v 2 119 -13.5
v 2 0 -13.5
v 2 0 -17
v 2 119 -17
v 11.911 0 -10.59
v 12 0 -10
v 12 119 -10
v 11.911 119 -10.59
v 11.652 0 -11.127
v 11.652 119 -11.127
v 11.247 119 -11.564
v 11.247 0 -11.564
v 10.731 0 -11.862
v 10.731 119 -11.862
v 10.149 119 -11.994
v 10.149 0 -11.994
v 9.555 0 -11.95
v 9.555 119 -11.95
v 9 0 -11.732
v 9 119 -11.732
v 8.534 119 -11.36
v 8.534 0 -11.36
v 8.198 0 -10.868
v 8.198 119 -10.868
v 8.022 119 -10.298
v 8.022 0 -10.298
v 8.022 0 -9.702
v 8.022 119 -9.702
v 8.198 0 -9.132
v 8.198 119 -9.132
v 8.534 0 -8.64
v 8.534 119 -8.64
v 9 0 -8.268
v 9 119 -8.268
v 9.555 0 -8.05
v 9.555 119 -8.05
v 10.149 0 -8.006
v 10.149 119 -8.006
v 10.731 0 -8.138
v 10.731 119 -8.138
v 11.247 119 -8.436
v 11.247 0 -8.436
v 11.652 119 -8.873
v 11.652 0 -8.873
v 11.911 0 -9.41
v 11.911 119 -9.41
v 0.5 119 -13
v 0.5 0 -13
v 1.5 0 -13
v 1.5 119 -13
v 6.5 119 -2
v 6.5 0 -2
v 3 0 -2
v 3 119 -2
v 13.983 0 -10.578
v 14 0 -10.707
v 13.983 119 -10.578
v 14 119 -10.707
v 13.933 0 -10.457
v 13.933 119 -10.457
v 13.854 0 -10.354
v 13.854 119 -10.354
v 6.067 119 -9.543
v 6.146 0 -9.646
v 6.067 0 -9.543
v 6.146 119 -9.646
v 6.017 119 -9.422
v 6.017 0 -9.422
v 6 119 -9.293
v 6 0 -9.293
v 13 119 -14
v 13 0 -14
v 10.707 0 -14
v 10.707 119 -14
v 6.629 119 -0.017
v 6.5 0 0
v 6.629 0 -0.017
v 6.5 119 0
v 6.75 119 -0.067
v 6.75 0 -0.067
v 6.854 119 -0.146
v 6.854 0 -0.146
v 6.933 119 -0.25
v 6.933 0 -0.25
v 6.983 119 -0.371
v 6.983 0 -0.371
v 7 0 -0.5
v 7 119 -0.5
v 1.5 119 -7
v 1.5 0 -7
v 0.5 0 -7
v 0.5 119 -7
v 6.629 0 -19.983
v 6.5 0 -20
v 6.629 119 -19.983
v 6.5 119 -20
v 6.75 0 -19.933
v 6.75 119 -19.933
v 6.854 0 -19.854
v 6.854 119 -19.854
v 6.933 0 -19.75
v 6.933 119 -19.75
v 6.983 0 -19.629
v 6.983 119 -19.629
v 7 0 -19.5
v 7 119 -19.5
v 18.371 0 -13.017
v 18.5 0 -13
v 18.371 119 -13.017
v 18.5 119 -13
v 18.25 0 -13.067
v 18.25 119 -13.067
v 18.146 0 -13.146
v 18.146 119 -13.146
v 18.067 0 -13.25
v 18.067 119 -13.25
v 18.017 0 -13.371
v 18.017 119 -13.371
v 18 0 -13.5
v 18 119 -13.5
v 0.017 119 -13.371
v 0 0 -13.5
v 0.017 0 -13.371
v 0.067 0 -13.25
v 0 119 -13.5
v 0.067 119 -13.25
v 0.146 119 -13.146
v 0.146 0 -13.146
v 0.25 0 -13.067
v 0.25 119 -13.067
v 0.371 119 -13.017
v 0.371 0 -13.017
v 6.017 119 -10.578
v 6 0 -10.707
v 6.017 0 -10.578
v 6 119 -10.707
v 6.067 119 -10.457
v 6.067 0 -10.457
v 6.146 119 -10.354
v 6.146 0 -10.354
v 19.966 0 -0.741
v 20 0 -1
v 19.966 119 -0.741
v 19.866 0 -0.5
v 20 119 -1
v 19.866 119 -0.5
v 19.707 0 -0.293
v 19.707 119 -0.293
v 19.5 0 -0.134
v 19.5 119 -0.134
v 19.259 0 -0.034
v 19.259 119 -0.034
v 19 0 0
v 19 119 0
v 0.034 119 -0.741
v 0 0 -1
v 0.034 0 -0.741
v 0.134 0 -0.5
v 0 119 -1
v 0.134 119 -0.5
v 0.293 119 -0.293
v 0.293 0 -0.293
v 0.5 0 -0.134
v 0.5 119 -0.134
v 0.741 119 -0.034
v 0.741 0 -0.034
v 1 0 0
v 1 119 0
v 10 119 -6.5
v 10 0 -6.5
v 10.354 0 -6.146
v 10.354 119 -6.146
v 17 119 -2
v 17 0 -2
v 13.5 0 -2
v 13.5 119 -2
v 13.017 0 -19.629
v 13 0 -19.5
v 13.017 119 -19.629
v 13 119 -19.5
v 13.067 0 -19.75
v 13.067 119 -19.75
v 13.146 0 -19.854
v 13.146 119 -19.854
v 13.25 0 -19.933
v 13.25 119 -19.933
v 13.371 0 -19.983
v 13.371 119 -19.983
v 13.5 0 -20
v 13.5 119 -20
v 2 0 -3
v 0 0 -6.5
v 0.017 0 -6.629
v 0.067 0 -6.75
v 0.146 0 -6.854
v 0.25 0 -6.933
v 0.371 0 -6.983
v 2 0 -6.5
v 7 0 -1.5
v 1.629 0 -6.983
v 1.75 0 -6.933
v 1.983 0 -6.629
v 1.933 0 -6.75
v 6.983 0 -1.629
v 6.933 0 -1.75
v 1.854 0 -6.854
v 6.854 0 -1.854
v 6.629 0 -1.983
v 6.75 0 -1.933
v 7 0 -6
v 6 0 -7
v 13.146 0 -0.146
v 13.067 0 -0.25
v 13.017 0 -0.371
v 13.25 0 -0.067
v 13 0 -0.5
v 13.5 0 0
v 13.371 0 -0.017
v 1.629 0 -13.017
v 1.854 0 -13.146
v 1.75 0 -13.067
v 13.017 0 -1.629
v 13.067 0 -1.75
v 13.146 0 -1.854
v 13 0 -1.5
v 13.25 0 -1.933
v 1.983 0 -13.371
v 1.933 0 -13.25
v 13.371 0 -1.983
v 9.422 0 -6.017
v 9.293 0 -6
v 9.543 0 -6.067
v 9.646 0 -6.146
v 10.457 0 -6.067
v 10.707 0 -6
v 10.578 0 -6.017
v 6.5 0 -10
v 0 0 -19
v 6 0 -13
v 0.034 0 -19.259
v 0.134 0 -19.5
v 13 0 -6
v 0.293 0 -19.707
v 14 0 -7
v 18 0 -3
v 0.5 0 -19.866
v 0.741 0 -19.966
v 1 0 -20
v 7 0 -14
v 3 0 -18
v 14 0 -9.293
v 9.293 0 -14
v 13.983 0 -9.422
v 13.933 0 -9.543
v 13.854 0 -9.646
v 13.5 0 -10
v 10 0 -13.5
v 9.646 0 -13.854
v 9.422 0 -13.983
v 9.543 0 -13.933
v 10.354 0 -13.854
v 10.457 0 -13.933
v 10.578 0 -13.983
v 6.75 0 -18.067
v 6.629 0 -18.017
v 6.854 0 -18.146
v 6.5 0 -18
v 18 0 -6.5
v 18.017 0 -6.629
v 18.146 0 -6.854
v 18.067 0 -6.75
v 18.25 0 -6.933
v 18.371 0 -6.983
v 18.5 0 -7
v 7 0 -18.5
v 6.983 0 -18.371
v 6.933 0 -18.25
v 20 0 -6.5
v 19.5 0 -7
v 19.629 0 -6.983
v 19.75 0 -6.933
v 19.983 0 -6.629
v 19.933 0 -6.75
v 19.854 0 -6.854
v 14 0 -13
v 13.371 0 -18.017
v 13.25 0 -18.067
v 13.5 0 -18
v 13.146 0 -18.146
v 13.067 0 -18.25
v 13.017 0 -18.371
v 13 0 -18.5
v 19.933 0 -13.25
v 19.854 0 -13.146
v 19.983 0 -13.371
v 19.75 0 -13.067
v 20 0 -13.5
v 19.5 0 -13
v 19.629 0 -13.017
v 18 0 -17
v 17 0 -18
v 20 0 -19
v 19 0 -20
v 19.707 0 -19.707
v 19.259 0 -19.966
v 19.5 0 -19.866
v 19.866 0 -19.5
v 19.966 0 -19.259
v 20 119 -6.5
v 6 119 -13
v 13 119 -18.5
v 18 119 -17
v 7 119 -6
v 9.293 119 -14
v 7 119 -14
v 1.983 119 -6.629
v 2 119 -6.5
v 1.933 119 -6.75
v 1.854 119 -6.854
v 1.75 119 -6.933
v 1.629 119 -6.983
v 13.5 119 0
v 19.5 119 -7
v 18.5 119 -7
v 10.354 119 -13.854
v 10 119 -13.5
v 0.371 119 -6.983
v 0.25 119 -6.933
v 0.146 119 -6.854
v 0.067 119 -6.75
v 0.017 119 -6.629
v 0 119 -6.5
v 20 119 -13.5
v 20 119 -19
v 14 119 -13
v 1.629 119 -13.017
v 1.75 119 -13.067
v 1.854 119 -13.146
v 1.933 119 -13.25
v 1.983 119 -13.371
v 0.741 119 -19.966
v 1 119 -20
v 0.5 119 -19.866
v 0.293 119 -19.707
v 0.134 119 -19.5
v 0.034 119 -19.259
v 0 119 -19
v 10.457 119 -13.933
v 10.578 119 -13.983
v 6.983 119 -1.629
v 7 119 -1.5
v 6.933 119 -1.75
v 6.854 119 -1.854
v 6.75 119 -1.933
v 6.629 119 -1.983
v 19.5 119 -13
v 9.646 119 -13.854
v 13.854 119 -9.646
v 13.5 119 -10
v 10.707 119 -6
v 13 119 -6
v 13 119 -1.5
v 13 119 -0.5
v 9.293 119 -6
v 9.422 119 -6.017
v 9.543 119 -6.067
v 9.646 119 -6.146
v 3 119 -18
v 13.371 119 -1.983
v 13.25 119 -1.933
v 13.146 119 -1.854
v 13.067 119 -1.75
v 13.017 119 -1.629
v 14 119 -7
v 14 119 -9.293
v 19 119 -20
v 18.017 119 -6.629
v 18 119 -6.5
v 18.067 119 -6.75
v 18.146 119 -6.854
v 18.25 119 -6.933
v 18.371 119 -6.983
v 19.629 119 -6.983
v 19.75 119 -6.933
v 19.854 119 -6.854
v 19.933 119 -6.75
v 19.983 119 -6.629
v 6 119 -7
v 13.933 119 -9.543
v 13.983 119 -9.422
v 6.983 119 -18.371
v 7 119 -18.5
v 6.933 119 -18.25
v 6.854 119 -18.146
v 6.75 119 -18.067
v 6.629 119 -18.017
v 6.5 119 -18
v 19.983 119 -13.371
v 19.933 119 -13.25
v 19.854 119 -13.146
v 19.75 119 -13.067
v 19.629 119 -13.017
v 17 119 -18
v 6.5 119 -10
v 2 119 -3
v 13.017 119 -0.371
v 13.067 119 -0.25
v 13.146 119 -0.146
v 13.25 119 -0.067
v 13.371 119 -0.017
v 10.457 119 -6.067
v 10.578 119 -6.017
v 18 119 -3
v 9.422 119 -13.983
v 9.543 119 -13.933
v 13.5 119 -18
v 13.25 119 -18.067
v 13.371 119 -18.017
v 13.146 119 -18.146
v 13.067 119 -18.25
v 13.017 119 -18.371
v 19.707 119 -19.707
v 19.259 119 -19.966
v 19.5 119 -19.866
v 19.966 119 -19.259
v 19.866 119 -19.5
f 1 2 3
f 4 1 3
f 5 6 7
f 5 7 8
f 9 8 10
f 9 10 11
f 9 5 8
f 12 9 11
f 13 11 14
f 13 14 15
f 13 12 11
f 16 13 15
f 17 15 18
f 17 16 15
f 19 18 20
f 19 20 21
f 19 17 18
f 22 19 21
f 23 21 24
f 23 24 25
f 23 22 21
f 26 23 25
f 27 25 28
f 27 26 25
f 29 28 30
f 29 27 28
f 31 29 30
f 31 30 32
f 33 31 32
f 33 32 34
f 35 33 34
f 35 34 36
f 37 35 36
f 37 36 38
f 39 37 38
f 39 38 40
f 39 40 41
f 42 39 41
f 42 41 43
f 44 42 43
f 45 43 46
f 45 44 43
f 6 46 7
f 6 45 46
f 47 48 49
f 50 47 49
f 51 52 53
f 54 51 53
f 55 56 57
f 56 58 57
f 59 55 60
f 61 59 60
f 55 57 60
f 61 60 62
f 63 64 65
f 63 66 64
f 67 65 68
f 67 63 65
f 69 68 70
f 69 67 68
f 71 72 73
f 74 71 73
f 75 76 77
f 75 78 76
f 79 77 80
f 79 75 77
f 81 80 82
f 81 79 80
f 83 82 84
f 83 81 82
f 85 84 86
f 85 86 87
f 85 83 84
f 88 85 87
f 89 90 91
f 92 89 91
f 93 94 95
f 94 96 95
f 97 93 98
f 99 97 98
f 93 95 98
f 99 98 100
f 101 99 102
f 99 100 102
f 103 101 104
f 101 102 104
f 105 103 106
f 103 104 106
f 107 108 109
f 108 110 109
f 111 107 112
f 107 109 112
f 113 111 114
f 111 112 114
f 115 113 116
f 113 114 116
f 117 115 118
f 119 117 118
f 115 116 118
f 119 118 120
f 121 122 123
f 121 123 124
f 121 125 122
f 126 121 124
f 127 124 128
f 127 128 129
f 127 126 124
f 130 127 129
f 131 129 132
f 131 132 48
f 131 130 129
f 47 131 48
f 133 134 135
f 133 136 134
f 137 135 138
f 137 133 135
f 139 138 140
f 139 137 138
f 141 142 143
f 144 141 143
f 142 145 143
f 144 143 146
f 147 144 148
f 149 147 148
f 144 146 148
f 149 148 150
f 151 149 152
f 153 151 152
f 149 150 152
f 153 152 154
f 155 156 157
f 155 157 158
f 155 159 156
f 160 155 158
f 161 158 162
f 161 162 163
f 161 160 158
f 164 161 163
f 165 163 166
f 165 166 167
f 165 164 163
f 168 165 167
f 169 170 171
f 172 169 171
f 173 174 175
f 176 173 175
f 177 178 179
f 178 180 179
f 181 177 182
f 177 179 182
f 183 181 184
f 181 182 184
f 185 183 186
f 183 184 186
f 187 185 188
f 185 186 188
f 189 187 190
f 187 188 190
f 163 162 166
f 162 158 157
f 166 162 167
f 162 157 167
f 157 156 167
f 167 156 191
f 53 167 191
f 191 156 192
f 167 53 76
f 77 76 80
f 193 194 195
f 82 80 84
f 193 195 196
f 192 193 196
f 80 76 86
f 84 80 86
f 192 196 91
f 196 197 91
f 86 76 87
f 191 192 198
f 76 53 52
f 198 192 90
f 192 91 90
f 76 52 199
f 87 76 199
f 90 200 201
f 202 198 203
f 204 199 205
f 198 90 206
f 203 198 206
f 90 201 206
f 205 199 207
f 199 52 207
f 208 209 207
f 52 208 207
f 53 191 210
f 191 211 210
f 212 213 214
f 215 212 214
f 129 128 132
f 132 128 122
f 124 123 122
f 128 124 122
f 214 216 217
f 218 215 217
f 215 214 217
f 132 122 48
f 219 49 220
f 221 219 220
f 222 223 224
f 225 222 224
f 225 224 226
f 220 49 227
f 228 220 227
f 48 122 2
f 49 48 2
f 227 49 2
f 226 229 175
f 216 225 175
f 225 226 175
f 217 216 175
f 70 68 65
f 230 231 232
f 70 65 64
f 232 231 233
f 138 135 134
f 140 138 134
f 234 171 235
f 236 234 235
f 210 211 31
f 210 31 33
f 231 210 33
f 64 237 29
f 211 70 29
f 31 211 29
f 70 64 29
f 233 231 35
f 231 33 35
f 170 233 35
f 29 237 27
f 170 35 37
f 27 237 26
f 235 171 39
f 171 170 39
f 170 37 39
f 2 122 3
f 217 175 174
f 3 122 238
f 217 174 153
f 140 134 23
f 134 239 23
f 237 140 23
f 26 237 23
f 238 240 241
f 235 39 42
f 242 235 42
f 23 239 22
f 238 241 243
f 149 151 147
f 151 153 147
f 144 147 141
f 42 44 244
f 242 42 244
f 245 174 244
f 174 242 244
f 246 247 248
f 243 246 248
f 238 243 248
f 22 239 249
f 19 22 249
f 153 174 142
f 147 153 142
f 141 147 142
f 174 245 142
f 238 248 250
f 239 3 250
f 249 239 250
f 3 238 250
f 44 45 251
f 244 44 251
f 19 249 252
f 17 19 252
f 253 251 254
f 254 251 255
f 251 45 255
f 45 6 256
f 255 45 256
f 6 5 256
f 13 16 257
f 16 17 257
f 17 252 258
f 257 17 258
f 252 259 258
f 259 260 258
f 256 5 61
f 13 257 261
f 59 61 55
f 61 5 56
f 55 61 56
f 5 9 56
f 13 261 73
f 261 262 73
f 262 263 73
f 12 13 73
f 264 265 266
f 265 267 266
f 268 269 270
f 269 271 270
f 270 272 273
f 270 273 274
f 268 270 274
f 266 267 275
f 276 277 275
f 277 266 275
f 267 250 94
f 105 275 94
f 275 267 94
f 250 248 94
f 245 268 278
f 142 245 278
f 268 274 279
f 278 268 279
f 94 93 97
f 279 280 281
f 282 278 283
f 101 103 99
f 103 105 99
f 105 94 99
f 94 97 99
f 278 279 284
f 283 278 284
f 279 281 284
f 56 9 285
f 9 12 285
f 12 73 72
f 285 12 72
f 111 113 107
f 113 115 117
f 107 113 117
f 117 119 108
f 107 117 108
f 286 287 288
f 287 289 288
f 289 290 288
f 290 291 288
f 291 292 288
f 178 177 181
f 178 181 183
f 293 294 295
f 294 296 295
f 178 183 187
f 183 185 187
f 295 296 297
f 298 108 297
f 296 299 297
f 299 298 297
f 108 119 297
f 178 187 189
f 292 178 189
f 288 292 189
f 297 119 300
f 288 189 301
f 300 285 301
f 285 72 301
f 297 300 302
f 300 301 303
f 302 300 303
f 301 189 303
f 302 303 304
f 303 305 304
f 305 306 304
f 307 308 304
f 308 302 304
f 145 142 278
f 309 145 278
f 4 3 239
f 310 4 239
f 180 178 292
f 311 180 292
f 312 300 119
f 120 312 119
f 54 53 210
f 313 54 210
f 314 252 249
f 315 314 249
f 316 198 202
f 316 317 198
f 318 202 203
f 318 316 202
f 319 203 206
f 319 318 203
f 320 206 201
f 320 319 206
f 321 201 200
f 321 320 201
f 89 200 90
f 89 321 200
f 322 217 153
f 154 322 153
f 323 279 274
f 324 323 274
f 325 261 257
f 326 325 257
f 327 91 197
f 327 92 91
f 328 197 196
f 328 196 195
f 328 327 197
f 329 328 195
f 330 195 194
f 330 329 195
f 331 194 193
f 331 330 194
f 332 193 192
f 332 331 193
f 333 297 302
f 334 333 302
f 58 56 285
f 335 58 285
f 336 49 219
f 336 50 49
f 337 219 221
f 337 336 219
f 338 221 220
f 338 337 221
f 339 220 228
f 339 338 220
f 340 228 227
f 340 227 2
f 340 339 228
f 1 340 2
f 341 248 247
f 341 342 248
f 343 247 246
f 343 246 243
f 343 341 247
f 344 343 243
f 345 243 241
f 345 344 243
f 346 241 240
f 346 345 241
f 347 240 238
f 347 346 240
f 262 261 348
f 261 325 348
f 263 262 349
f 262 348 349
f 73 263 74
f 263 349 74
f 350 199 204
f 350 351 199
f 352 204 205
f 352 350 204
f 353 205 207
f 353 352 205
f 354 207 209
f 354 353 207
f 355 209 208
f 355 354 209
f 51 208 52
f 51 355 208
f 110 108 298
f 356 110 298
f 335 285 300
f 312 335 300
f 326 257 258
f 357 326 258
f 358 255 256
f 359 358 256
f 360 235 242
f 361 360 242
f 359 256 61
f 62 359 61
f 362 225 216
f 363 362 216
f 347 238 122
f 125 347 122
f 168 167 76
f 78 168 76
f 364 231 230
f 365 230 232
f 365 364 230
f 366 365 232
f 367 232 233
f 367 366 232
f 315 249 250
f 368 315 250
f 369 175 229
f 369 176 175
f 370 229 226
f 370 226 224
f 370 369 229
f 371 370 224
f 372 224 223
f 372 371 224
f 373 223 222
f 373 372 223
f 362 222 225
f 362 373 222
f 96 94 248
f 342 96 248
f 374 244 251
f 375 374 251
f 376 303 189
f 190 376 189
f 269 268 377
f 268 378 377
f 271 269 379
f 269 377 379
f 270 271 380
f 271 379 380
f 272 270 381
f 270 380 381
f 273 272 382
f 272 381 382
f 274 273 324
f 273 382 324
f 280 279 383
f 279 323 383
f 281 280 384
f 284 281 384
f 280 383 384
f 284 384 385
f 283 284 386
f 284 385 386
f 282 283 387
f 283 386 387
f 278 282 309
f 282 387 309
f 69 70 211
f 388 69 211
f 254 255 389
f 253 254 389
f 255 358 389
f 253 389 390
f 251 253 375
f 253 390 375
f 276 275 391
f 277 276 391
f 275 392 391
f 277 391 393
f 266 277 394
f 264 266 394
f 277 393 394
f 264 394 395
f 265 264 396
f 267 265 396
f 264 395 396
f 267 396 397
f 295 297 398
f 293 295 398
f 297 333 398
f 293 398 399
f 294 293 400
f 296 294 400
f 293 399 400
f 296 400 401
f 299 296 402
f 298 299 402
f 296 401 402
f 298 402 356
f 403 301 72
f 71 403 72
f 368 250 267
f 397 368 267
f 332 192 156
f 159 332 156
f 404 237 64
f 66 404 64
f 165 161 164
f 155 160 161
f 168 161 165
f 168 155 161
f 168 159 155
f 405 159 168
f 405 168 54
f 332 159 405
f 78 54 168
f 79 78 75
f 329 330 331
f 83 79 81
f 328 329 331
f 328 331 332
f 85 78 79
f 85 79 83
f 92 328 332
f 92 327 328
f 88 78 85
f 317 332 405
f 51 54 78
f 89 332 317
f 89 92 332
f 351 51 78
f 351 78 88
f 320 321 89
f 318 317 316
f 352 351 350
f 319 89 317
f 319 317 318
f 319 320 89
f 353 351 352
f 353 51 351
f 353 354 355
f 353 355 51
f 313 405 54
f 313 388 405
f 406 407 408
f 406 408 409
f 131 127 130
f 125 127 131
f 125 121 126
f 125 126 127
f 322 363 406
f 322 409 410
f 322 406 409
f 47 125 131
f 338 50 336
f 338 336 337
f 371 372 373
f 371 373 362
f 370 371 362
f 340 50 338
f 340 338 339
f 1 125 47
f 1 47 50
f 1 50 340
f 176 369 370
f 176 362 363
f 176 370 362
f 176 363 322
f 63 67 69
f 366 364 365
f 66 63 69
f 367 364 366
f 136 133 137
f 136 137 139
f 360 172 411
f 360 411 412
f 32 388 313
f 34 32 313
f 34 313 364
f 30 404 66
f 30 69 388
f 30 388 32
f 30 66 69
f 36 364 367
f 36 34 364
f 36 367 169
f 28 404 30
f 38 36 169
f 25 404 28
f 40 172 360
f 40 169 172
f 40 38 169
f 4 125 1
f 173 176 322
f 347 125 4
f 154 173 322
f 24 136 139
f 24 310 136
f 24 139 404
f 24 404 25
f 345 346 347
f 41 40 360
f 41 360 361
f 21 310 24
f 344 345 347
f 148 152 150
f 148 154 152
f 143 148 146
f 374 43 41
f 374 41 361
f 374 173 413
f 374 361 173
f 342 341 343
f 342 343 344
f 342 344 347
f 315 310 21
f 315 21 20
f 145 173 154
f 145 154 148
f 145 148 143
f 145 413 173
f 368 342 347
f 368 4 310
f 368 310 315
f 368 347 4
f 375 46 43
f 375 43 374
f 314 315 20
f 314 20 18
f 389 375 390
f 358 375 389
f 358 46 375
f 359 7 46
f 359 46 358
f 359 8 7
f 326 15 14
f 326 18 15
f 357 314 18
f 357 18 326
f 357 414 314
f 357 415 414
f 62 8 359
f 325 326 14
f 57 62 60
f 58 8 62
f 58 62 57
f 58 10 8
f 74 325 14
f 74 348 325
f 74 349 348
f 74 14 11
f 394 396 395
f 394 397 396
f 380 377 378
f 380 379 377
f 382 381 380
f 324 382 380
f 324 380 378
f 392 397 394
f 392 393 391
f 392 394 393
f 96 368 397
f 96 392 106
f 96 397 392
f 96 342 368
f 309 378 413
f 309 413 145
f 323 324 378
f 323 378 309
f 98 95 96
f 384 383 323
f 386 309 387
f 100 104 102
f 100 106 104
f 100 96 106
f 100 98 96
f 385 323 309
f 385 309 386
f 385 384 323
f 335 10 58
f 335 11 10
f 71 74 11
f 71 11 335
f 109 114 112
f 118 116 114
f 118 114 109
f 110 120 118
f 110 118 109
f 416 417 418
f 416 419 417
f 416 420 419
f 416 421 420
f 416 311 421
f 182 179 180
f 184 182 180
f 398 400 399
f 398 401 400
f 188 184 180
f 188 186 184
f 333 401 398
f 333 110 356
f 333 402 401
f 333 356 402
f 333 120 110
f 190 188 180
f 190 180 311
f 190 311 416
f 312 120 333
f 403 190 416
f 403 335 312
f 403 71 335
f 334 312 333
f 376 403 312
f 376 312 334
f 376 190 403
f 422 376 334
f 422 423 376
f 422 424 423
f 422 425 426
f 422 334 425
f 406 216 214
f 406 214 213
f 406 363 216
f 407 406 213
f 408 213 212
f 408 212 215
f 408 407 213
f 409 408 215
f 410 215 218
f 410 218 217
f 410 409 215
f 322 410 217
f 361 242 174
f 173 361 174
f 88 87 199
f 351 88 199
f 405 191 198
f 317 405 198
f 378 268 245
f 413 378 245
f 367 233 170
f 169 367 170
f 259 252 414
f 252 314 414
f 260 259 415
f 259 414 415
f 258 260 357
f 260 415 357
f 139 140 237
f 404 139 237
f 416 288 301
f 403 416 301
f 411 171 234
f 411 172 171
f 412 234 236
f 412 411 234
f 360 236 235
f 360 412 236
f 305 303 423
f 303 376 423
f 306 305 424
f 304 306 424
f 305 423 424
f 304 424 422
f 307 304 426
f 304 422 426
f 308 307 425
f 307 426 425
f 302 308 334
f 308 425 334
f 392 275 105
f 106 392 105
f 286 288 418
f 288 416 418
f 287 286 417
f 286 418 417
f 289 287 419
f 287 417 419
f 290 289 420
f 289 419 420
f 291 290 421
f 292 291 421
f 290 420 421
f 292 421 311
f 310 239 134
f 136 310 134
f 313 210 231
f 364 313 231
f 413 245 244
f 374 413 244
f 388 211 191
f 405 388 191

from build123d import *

# Parameters (mm, degrees)
SKETCH1_R           = 2
BOSS_EXTRUDE1_DEPTH = 119
FILLET1_R           = 1
FILLET2_R           = 0.5
FILLET4_R           = 0.5


with BuildPart() as part:
    # Sketch1 → Boss-Extrude1 (new body)
    with BuildSketch(Plane(origin=(0, 0, 0), x_dir=(1, 0, 0), z_dir=(0, 1, 0))):
        Polygon((7, 18), (7, 20), (0, 20), (0, 13), (2, 13), (2, 17), (6, 13), (6, 10.5), (6.5, 10), (6, 9.5), (6, 7), (2, 3), (2, 7), (0, 7), (0, 0), (7, 0), (7, 2), (3, 2), (7, 6), (9.5, 6), (10, 6.5), (10.5, 6), (13, 6), (17, 2), (13, 2), (13, 0), (20, 0), (20, 7), (18, 7), (18, 3), (14, 7), (14, 9.5), (13.5, 10), (14, 10.5), (14, 13), (18, 17), (18, 13), (20, 13), (20, 20), (13, 20), (13, 18), (17, 18), (13, 14), (10.5, 14), (10, 13.5), (9.5, 14), (7, 14), (3, 18), align=None)
        with Locations((10, 10)):
            Circle(SKETCH1_R, mode=Mode.SUBTRACT)
    extrude(amount=BOSS_EXTRUDE1_DEPTH)

    # Fillet1
    fillet1_edges = [part.edges().sort_by_distance(p)[0] for p in [
        (20, 59.5, 0),
        (0, 59.5, 0),
        (0, 59.5, -20),
        (20, 59.5, -20),
    ]]
    fillet(fillet1_edges, radius=FILLET1_R)

    # Fillet2
    fillet2_edges = [part.edges().sort_by_distance(p)[0] for p in [
        (18, 59.5, -7),
        (20, 59.5, -7),
        (13, 59.5, 0),
        (13, 59.5, -2),
        (7, 59.5, -2),
        (7, 59.5, 0),
        (0, 59.5, -7),
        (2, 59.5, -7),
        (2, 59.5, -13),
        (0, 59.5, -13),
        (7, 59.5, -20),
        (7, 59.5, -18),
        (13, 59.5, -18),
        (13, 59.5, -20),
        (20, 59.5, -13),
        (18, 59.5, -13),
    ]]
    fillet(fillet2_edges, radius=FILLET2_R)

    # Fillet4
    fillet4_edges = [part.edges().sort_by_distance(p)[0] for p in [
        (10.5, 59.5, -6),
        (9.5, 59.5, -6),
        (6, 59.5, -9.5),
        (6, 59.5, -10.5),
        (9.5, 59.5, -14),
        (10.5, 59.5, -14),
        (14, 59.5, -10.5),
        (14, 59.5, -9.5),
    ]]
    fillet(fillet4_edges, radius=FILLET4_R)


solid = part.part
